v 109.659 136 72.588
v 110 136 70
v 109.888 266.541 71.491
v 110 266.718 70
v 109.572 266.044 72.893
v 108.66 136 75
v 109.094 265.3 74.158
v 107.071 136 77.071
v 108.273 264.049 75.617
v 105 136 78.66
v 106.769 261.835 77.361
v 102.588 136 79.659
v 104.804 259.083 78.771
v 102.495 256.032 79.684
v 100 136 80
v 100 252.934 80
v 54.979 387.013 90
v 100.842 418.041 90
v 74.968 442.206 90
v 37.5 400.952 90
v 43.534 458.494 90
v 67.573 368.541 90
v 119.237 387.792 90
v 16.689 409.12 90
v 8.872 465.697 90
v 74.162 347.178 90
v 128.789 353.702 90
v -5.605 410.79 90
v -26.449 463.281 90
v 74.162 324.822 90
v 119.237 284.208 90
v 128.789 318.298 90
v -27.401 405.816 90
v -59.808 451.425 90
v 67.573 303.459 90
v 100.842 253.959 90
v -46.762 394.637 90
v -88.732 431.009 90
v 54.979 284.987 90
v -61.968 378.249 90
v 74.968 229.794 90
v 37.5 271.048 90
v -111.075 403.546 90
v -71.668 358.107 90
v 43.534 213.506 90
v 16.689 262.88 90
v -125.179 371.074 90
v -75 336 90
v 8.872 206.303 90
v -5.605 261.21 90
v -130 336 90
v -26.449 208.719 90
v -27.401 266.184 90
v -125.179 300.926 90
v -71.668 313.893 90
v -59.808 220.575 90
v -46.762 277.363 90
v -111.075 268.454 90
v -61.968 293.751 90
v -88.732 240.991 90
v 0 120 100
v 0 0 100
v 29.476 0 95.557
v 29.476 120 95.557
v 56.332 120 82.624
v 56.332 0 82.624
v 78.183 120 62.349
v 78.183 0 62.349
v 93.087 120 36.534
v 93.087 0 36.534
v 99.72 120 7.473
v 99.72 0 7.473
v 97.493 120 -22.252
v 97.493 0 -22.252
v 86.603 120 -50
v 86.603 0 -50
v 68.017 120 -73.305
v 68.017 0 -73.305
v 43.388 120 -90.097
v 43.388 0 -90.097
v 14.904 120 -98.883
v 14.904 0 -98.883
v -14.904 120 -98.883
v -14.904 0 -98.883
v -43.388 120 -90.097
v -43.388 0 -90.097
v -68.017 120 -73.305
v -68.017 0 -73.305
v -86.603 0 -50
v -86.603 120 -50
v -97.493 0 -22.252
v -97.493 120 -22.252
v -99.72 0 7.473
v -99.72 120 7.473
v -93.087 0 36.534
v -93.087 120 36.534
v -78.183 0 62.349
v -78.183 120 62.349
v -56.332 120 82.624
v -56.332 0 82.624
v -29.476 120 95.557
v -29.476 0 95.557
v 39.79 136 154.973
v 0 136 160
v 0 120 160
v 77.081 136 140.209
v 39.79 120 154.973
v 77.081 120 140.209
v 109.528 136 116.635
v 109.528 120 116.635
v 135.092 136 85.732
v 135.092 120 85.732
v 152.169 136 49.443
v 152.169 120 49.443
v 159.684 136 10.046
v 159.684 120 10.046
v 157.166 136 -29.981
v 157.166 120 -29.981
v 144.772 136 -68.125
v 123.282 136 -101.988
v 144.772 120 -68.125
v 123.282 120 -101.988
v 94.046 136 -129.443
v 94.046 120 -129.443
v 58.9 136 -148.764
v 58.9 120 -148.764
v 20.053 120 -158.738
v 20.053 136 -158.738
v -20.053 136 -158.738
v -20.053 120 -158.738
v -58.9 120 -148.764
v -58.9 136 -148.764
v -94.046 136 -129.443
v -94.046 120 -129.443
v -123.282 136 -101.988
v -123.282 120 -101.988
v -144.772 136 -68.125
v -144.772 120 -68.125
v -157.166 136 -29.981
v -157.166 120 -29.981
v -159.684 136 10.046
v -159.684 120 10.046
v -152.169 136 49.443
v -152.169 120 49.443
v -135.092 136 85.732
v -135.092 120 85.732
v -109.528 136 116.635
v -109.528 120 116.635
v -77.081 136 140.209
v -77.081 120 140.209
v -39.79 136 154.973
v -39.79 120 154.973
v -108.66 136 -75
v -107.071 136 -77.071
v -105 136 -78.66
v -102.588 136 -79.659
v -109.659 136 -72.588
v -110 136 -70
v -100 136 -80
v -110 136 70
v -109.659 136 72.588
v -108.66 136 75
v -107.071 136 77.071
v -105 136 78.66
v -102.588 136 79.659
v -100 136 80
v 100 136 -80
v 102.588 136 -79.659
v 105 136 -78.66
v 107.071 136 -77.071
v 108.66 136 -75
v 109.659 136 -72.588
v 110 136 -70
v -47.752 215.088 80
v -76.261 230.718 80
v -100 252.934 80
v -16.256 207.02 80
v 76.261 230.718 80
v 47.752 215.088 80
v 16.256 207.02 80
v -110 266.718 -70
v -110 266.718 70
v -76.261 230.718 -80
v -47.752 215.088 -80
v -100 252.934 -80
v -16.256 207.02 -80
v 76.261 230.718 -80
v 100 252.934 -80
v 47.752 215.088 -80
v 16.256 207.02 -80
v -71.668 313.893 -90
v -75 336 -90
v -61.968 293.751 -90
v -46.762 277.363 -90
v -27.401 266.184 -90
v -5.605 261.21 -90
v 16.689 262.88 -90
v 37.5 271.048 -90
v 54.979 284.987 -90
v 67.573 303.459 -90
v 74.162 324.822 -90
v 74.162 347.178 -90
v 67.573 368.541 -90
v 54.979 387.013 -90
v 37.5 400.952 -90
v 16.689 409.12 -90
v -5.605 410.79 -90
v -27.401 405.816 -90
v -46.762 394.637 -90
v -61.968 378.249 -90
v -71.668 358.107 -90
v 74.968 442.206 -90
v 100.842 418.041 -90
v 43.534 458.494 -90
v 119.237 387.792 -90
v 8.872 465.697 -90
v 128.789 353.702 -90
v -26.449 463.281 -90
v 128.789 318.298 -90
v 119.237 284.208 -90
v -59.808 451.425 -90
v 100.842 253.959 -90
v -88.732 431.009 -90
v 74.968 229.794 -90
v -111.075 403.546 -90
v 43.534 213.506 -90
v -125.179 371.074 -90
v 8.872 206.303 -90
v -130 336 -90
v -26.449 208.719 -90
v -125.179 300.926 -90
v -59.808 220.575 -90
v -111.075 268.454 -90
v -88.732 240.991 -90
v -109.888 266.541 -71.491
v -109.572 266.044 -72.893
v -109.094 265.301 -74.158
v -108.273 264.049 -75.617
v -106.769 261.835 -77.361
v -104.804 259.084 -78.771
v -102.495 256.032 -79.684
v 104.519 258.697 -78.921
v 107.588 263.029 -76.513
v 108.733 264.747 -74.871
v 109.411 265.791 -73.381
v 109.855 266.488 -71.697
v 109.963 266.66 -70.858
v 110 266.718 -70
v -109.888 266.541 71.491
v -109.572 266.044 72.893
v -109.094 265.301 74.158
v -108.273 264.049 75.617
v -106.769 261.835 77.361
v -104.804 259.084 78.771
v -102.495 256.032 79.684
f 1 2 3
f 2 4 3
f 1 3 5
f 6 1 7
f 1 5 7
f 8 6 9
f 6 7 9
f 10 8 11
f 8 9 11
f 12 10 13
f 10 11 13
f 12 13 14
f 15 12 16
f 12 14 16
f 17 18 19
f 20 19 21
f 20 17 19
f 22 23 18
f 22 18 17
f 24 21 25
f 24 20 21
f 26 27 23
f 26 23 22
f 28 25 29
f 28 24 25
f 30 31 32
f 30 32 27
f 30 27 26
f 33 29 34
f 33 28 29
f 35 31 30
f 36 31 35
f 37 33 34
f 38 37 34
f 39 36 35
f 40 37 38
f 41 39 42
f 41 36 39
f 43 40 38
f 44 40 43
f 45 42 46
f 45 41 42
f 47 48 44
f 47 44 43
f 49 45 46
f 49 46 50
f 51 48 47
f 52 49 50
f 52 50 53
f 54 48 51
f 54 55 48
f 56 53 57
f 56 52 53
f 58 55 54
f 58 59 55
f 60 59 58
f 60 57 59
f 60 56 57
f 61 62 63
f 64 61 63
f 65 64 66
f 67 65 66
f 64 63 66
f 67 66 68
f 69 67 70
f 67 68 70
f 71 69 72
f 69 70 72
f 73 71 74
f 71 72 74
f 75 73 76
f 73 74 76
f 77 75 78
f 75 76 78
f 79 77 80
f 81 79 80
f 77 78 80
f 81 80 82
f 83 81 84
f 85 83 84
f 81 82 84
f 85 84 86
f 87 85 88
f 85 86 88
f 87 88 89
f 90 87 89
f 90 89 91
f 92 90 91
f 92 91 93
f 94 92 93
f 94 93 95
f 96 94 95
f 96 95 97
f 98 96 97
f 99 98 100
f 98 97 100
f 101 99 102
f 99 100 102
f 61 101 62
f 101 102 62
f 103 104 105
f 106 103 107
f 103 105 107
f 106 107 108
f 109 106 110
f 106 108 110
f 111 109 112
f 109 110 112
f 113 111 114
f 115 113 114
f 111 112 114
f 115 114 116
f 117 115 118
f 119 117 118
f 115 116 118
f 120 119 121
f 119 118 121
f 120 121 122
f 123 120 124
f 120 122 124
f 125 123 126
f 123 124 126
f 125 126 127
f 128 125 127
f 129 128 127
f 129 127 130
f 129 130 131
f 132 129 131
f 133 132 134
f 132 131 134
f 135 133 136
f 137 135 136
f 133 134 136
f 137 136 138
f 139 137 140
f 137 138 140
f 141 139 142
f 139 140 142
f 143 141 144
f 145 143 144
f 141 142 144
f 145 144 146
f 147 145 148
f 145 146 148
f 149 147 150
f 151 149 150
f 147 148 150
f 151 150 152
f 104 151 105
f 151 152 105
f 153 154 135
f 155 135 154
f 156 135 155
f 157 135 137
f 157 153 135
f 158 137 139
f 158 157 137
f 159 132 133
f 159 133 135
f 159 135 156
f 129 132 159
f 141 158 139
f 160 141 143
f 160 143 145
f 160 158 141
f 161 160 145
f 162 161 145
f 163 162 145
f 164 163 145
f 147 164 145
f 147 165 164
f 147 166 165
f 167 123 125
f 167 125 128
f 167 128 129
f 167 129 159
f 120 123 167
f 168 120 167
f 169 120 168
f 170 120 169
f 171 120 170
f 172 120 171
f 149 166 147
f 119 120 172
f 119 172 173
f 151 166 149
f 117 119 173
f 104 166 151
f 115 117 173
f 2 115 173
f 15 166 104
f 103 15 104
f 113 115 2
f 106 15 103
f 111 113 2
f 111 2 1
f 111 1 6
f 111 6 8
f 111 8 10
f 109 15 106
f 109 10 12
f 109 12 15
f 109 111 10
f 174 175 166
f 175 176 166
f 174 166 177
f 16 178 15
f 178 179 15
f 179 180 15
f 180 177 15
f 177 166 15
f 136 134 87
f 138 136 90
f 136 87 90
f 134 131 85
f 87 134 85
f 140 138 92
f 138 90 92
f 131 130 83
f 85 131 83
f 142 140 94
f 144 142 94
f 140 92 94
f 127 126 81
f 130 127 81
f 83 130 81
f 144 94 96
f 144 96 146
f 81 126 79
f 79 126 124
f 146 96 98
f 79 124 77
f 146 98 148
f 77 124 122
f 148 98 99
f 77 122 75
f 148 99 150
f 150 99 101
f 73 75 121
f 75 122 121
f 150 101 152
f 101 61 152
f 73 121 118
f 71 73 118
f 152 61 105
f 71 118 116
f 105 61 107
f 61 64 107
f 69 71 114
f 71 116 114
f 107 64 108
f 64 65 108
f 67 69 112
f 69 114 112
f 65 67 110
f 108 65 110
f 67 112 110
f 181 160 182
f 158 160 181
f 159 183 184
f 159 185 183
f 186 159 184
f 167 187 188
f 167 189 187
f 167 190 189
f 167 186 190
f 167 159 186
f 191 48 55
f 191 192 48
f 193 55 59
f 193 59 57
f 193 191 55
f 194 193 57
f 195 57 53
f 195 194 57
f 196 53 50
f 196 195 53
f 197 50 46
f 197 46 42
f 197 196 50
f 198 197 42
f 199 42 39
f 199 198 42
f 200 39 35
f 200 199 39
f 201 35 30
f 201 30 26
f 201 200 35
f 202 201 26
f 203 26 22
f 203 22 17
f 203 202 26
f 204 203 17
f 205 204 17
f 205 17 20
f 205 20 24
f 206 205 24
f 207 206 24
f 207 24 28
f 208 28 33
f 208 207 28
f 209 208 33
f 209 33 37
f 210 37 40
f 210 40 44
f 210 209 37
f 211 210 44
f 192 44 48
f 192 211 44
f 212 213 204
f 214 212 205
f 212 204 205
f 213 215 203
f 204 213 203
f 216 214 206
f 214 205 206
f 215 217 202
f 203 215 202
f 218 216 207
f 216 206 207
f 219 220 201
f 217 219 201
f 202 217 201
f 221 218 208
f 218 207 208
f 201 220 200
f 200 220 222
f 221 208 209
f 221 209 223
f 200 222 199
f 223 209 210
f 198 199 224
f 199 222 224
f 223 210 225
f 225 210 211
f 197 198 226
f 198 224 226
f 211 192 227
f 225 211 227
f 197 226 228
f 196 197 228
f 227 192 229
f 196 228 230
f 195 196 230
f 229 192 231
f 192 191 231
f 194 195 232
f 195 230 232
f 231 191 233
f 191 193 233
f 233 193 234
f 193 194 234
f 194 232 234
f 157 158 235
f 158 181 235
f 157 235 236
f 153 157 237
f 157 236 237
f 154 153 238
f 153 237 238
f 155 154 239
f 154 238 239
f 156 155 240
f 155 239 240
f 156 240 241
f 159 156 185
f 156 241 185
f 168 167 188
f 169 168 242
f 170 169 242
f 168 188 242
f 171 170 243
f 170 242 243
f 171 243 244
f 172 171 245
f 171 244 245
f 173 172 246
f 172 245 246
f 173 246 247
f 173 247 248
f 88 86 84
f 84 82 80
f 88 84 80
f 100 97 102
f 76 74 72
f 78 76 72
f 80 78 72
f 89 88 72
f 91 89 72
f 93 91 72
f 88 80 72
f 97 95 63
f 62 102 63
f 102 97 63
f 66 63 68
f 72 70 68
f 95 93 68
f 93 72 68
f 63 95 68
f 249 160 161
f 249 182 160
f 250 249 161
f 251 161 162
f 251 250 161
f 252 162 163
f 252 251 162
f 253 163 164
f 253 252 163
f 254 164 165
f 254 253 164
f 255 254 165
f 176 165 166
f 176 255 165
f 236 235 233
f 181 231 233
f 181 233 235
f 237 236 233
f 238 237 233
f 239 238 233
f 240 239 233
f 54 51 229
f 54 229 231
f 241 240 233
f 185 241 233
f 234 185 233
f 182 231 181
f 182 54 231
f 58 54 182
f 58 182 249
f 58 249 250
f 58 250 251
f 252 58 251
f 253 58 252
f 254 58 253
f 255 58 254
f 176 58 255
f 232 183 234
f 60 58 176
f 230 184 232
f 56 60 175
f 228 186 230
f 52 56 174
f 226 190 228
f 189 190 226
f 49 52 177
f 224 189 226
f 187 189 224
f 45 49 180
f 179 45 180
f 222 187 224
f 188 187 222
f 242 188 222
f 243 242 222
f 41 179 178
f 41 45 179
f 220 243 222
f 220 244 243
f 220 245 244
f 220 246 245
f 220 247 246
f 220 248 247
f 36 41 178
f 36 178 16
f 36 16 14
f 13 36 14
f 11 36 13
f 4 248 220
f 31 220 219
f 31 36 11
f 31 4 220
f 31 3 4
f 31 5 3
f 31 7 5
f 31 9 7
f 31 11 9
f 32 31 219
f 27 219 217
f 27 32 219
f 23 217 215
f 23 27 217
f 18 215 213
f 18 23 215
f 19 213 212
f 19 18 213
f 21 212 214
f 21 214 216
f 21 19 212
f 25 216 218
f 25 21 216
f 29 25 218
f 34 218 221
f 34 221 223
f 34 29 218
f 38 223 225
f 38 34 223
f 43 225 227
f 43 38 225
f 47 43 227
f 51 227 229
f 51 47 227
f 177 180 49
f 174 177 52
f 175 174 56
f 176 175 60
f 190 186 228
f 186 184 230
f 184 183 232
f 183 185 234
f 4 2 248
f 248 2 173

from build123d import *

# Parameters (mm, degrees)
SKETCH1_R                = 100
BOSS_EXTRUDE1_DEPTH      = 120
SKETCH2_R                = 160
BOSS_EXTRUDE3_DEPTH      = 16
SKETCH3_R                = 130
SKETCH3_R_2              = 75
BOSS_EXTRUDE4_DEPTH      = 90
BOSS_EXTRUDE5_REACH      = 402.125
BOSS_EXTRUDE5_END_RADIUS = 130
SKETCH4_W                = 220
SKETCH4_H                = 160
FILLET1_R                = 10


with BuildPart() as part:
    # Sketch1 → Boss-Extrude1 (new body)
    with BuildSketch(Plane(origin=(0, 0, 0), x_dir=(1, 0, 0), z_dir=(0, 1, 0))):
        with Locations(Location((0, 0, 0), (0, 0, 270))):
            Circle(SKETCH1_R)
    extrude(amount=BOSS_EXTRUDE1_DEPTH)

    # Sketch2 → Boss-Extrude3 (add)
    with BuildSketch(Plane(origin=(0, 120, 0), x_dir=(1, 0, 0), z_dir=(0, 1, 0))):
        with Locations(Location((0, 0, 0), (0, 0, 270))):
            Circle(SKETCH2_R)
    extrude(amount=BOSS_EXTRUDE3_DEPTH)



with BuildPart() as body_2:
    # Sketch3 → Boss-Extrude4 (new, symmetric)
    with BuildSketch(Plane.XY):
        with Locations(Location((0, 336, 0), (0, 0, 180))):
            Circle(SKETCH3_R)
        with Locations(Location((0, 336, 0), (0, 0, 180))):
            Circle(SKETCH3_R_2, mode=Mode.SUBTRACT)
    extrude(amount=BOSS_EXTRUDE4_DEPTH, both=True)


with BuildPart() as part_1:
    add(part.part)

    add(body_2.part)  # Boss-Extrude5 merges body 2
    # Boss-Extrude5: up to this cylinder (the profile starts outside it)
    boss_extrude5_end = Plane(origin=(0, 336, 0), z_dir=(0, 0, -1)) * Cylinder(BOSS_EXTRUDE5_END_RADIUS, 1065.25, mode=Mode.PRIVATE)
    # Sketch4 → Boss-Extrude5 (add, up to the surface)
    with BuildSketch(Plane(origin=(0, 136, 0), x_dir=(1, 0, 0), z_dir=(0, 1, 0)), mode=Mode.PRIVATE) as boss_extrude5_sk1:
        Rectangle(SKETCH4_W, SKETCH4_H)
    boss_extrude5_tool1 = extrude(boss_extrude5_sk1.sketch, amount=BOSS_EXTRUDE5_REACH, mode=Mode.PRIVATE) - boss_extrude5_end
    add(boss_extrude5_tool1.solids().sort_by_distance((0, 136, 0))[0])

    # Fillet1
    fillet1_edges = [part_1.edges().sort_by_distance(p)[0] for p in [
        (110, 201.358983849, -80),
        (110, 201.358983849, 80),
        (-110, 201.358983849, -80),
        (-110, 201.358983849, 80),
    ]]
    fillet(fillet1_edges, radius=FILLET1_R)


solid = part_1.part
